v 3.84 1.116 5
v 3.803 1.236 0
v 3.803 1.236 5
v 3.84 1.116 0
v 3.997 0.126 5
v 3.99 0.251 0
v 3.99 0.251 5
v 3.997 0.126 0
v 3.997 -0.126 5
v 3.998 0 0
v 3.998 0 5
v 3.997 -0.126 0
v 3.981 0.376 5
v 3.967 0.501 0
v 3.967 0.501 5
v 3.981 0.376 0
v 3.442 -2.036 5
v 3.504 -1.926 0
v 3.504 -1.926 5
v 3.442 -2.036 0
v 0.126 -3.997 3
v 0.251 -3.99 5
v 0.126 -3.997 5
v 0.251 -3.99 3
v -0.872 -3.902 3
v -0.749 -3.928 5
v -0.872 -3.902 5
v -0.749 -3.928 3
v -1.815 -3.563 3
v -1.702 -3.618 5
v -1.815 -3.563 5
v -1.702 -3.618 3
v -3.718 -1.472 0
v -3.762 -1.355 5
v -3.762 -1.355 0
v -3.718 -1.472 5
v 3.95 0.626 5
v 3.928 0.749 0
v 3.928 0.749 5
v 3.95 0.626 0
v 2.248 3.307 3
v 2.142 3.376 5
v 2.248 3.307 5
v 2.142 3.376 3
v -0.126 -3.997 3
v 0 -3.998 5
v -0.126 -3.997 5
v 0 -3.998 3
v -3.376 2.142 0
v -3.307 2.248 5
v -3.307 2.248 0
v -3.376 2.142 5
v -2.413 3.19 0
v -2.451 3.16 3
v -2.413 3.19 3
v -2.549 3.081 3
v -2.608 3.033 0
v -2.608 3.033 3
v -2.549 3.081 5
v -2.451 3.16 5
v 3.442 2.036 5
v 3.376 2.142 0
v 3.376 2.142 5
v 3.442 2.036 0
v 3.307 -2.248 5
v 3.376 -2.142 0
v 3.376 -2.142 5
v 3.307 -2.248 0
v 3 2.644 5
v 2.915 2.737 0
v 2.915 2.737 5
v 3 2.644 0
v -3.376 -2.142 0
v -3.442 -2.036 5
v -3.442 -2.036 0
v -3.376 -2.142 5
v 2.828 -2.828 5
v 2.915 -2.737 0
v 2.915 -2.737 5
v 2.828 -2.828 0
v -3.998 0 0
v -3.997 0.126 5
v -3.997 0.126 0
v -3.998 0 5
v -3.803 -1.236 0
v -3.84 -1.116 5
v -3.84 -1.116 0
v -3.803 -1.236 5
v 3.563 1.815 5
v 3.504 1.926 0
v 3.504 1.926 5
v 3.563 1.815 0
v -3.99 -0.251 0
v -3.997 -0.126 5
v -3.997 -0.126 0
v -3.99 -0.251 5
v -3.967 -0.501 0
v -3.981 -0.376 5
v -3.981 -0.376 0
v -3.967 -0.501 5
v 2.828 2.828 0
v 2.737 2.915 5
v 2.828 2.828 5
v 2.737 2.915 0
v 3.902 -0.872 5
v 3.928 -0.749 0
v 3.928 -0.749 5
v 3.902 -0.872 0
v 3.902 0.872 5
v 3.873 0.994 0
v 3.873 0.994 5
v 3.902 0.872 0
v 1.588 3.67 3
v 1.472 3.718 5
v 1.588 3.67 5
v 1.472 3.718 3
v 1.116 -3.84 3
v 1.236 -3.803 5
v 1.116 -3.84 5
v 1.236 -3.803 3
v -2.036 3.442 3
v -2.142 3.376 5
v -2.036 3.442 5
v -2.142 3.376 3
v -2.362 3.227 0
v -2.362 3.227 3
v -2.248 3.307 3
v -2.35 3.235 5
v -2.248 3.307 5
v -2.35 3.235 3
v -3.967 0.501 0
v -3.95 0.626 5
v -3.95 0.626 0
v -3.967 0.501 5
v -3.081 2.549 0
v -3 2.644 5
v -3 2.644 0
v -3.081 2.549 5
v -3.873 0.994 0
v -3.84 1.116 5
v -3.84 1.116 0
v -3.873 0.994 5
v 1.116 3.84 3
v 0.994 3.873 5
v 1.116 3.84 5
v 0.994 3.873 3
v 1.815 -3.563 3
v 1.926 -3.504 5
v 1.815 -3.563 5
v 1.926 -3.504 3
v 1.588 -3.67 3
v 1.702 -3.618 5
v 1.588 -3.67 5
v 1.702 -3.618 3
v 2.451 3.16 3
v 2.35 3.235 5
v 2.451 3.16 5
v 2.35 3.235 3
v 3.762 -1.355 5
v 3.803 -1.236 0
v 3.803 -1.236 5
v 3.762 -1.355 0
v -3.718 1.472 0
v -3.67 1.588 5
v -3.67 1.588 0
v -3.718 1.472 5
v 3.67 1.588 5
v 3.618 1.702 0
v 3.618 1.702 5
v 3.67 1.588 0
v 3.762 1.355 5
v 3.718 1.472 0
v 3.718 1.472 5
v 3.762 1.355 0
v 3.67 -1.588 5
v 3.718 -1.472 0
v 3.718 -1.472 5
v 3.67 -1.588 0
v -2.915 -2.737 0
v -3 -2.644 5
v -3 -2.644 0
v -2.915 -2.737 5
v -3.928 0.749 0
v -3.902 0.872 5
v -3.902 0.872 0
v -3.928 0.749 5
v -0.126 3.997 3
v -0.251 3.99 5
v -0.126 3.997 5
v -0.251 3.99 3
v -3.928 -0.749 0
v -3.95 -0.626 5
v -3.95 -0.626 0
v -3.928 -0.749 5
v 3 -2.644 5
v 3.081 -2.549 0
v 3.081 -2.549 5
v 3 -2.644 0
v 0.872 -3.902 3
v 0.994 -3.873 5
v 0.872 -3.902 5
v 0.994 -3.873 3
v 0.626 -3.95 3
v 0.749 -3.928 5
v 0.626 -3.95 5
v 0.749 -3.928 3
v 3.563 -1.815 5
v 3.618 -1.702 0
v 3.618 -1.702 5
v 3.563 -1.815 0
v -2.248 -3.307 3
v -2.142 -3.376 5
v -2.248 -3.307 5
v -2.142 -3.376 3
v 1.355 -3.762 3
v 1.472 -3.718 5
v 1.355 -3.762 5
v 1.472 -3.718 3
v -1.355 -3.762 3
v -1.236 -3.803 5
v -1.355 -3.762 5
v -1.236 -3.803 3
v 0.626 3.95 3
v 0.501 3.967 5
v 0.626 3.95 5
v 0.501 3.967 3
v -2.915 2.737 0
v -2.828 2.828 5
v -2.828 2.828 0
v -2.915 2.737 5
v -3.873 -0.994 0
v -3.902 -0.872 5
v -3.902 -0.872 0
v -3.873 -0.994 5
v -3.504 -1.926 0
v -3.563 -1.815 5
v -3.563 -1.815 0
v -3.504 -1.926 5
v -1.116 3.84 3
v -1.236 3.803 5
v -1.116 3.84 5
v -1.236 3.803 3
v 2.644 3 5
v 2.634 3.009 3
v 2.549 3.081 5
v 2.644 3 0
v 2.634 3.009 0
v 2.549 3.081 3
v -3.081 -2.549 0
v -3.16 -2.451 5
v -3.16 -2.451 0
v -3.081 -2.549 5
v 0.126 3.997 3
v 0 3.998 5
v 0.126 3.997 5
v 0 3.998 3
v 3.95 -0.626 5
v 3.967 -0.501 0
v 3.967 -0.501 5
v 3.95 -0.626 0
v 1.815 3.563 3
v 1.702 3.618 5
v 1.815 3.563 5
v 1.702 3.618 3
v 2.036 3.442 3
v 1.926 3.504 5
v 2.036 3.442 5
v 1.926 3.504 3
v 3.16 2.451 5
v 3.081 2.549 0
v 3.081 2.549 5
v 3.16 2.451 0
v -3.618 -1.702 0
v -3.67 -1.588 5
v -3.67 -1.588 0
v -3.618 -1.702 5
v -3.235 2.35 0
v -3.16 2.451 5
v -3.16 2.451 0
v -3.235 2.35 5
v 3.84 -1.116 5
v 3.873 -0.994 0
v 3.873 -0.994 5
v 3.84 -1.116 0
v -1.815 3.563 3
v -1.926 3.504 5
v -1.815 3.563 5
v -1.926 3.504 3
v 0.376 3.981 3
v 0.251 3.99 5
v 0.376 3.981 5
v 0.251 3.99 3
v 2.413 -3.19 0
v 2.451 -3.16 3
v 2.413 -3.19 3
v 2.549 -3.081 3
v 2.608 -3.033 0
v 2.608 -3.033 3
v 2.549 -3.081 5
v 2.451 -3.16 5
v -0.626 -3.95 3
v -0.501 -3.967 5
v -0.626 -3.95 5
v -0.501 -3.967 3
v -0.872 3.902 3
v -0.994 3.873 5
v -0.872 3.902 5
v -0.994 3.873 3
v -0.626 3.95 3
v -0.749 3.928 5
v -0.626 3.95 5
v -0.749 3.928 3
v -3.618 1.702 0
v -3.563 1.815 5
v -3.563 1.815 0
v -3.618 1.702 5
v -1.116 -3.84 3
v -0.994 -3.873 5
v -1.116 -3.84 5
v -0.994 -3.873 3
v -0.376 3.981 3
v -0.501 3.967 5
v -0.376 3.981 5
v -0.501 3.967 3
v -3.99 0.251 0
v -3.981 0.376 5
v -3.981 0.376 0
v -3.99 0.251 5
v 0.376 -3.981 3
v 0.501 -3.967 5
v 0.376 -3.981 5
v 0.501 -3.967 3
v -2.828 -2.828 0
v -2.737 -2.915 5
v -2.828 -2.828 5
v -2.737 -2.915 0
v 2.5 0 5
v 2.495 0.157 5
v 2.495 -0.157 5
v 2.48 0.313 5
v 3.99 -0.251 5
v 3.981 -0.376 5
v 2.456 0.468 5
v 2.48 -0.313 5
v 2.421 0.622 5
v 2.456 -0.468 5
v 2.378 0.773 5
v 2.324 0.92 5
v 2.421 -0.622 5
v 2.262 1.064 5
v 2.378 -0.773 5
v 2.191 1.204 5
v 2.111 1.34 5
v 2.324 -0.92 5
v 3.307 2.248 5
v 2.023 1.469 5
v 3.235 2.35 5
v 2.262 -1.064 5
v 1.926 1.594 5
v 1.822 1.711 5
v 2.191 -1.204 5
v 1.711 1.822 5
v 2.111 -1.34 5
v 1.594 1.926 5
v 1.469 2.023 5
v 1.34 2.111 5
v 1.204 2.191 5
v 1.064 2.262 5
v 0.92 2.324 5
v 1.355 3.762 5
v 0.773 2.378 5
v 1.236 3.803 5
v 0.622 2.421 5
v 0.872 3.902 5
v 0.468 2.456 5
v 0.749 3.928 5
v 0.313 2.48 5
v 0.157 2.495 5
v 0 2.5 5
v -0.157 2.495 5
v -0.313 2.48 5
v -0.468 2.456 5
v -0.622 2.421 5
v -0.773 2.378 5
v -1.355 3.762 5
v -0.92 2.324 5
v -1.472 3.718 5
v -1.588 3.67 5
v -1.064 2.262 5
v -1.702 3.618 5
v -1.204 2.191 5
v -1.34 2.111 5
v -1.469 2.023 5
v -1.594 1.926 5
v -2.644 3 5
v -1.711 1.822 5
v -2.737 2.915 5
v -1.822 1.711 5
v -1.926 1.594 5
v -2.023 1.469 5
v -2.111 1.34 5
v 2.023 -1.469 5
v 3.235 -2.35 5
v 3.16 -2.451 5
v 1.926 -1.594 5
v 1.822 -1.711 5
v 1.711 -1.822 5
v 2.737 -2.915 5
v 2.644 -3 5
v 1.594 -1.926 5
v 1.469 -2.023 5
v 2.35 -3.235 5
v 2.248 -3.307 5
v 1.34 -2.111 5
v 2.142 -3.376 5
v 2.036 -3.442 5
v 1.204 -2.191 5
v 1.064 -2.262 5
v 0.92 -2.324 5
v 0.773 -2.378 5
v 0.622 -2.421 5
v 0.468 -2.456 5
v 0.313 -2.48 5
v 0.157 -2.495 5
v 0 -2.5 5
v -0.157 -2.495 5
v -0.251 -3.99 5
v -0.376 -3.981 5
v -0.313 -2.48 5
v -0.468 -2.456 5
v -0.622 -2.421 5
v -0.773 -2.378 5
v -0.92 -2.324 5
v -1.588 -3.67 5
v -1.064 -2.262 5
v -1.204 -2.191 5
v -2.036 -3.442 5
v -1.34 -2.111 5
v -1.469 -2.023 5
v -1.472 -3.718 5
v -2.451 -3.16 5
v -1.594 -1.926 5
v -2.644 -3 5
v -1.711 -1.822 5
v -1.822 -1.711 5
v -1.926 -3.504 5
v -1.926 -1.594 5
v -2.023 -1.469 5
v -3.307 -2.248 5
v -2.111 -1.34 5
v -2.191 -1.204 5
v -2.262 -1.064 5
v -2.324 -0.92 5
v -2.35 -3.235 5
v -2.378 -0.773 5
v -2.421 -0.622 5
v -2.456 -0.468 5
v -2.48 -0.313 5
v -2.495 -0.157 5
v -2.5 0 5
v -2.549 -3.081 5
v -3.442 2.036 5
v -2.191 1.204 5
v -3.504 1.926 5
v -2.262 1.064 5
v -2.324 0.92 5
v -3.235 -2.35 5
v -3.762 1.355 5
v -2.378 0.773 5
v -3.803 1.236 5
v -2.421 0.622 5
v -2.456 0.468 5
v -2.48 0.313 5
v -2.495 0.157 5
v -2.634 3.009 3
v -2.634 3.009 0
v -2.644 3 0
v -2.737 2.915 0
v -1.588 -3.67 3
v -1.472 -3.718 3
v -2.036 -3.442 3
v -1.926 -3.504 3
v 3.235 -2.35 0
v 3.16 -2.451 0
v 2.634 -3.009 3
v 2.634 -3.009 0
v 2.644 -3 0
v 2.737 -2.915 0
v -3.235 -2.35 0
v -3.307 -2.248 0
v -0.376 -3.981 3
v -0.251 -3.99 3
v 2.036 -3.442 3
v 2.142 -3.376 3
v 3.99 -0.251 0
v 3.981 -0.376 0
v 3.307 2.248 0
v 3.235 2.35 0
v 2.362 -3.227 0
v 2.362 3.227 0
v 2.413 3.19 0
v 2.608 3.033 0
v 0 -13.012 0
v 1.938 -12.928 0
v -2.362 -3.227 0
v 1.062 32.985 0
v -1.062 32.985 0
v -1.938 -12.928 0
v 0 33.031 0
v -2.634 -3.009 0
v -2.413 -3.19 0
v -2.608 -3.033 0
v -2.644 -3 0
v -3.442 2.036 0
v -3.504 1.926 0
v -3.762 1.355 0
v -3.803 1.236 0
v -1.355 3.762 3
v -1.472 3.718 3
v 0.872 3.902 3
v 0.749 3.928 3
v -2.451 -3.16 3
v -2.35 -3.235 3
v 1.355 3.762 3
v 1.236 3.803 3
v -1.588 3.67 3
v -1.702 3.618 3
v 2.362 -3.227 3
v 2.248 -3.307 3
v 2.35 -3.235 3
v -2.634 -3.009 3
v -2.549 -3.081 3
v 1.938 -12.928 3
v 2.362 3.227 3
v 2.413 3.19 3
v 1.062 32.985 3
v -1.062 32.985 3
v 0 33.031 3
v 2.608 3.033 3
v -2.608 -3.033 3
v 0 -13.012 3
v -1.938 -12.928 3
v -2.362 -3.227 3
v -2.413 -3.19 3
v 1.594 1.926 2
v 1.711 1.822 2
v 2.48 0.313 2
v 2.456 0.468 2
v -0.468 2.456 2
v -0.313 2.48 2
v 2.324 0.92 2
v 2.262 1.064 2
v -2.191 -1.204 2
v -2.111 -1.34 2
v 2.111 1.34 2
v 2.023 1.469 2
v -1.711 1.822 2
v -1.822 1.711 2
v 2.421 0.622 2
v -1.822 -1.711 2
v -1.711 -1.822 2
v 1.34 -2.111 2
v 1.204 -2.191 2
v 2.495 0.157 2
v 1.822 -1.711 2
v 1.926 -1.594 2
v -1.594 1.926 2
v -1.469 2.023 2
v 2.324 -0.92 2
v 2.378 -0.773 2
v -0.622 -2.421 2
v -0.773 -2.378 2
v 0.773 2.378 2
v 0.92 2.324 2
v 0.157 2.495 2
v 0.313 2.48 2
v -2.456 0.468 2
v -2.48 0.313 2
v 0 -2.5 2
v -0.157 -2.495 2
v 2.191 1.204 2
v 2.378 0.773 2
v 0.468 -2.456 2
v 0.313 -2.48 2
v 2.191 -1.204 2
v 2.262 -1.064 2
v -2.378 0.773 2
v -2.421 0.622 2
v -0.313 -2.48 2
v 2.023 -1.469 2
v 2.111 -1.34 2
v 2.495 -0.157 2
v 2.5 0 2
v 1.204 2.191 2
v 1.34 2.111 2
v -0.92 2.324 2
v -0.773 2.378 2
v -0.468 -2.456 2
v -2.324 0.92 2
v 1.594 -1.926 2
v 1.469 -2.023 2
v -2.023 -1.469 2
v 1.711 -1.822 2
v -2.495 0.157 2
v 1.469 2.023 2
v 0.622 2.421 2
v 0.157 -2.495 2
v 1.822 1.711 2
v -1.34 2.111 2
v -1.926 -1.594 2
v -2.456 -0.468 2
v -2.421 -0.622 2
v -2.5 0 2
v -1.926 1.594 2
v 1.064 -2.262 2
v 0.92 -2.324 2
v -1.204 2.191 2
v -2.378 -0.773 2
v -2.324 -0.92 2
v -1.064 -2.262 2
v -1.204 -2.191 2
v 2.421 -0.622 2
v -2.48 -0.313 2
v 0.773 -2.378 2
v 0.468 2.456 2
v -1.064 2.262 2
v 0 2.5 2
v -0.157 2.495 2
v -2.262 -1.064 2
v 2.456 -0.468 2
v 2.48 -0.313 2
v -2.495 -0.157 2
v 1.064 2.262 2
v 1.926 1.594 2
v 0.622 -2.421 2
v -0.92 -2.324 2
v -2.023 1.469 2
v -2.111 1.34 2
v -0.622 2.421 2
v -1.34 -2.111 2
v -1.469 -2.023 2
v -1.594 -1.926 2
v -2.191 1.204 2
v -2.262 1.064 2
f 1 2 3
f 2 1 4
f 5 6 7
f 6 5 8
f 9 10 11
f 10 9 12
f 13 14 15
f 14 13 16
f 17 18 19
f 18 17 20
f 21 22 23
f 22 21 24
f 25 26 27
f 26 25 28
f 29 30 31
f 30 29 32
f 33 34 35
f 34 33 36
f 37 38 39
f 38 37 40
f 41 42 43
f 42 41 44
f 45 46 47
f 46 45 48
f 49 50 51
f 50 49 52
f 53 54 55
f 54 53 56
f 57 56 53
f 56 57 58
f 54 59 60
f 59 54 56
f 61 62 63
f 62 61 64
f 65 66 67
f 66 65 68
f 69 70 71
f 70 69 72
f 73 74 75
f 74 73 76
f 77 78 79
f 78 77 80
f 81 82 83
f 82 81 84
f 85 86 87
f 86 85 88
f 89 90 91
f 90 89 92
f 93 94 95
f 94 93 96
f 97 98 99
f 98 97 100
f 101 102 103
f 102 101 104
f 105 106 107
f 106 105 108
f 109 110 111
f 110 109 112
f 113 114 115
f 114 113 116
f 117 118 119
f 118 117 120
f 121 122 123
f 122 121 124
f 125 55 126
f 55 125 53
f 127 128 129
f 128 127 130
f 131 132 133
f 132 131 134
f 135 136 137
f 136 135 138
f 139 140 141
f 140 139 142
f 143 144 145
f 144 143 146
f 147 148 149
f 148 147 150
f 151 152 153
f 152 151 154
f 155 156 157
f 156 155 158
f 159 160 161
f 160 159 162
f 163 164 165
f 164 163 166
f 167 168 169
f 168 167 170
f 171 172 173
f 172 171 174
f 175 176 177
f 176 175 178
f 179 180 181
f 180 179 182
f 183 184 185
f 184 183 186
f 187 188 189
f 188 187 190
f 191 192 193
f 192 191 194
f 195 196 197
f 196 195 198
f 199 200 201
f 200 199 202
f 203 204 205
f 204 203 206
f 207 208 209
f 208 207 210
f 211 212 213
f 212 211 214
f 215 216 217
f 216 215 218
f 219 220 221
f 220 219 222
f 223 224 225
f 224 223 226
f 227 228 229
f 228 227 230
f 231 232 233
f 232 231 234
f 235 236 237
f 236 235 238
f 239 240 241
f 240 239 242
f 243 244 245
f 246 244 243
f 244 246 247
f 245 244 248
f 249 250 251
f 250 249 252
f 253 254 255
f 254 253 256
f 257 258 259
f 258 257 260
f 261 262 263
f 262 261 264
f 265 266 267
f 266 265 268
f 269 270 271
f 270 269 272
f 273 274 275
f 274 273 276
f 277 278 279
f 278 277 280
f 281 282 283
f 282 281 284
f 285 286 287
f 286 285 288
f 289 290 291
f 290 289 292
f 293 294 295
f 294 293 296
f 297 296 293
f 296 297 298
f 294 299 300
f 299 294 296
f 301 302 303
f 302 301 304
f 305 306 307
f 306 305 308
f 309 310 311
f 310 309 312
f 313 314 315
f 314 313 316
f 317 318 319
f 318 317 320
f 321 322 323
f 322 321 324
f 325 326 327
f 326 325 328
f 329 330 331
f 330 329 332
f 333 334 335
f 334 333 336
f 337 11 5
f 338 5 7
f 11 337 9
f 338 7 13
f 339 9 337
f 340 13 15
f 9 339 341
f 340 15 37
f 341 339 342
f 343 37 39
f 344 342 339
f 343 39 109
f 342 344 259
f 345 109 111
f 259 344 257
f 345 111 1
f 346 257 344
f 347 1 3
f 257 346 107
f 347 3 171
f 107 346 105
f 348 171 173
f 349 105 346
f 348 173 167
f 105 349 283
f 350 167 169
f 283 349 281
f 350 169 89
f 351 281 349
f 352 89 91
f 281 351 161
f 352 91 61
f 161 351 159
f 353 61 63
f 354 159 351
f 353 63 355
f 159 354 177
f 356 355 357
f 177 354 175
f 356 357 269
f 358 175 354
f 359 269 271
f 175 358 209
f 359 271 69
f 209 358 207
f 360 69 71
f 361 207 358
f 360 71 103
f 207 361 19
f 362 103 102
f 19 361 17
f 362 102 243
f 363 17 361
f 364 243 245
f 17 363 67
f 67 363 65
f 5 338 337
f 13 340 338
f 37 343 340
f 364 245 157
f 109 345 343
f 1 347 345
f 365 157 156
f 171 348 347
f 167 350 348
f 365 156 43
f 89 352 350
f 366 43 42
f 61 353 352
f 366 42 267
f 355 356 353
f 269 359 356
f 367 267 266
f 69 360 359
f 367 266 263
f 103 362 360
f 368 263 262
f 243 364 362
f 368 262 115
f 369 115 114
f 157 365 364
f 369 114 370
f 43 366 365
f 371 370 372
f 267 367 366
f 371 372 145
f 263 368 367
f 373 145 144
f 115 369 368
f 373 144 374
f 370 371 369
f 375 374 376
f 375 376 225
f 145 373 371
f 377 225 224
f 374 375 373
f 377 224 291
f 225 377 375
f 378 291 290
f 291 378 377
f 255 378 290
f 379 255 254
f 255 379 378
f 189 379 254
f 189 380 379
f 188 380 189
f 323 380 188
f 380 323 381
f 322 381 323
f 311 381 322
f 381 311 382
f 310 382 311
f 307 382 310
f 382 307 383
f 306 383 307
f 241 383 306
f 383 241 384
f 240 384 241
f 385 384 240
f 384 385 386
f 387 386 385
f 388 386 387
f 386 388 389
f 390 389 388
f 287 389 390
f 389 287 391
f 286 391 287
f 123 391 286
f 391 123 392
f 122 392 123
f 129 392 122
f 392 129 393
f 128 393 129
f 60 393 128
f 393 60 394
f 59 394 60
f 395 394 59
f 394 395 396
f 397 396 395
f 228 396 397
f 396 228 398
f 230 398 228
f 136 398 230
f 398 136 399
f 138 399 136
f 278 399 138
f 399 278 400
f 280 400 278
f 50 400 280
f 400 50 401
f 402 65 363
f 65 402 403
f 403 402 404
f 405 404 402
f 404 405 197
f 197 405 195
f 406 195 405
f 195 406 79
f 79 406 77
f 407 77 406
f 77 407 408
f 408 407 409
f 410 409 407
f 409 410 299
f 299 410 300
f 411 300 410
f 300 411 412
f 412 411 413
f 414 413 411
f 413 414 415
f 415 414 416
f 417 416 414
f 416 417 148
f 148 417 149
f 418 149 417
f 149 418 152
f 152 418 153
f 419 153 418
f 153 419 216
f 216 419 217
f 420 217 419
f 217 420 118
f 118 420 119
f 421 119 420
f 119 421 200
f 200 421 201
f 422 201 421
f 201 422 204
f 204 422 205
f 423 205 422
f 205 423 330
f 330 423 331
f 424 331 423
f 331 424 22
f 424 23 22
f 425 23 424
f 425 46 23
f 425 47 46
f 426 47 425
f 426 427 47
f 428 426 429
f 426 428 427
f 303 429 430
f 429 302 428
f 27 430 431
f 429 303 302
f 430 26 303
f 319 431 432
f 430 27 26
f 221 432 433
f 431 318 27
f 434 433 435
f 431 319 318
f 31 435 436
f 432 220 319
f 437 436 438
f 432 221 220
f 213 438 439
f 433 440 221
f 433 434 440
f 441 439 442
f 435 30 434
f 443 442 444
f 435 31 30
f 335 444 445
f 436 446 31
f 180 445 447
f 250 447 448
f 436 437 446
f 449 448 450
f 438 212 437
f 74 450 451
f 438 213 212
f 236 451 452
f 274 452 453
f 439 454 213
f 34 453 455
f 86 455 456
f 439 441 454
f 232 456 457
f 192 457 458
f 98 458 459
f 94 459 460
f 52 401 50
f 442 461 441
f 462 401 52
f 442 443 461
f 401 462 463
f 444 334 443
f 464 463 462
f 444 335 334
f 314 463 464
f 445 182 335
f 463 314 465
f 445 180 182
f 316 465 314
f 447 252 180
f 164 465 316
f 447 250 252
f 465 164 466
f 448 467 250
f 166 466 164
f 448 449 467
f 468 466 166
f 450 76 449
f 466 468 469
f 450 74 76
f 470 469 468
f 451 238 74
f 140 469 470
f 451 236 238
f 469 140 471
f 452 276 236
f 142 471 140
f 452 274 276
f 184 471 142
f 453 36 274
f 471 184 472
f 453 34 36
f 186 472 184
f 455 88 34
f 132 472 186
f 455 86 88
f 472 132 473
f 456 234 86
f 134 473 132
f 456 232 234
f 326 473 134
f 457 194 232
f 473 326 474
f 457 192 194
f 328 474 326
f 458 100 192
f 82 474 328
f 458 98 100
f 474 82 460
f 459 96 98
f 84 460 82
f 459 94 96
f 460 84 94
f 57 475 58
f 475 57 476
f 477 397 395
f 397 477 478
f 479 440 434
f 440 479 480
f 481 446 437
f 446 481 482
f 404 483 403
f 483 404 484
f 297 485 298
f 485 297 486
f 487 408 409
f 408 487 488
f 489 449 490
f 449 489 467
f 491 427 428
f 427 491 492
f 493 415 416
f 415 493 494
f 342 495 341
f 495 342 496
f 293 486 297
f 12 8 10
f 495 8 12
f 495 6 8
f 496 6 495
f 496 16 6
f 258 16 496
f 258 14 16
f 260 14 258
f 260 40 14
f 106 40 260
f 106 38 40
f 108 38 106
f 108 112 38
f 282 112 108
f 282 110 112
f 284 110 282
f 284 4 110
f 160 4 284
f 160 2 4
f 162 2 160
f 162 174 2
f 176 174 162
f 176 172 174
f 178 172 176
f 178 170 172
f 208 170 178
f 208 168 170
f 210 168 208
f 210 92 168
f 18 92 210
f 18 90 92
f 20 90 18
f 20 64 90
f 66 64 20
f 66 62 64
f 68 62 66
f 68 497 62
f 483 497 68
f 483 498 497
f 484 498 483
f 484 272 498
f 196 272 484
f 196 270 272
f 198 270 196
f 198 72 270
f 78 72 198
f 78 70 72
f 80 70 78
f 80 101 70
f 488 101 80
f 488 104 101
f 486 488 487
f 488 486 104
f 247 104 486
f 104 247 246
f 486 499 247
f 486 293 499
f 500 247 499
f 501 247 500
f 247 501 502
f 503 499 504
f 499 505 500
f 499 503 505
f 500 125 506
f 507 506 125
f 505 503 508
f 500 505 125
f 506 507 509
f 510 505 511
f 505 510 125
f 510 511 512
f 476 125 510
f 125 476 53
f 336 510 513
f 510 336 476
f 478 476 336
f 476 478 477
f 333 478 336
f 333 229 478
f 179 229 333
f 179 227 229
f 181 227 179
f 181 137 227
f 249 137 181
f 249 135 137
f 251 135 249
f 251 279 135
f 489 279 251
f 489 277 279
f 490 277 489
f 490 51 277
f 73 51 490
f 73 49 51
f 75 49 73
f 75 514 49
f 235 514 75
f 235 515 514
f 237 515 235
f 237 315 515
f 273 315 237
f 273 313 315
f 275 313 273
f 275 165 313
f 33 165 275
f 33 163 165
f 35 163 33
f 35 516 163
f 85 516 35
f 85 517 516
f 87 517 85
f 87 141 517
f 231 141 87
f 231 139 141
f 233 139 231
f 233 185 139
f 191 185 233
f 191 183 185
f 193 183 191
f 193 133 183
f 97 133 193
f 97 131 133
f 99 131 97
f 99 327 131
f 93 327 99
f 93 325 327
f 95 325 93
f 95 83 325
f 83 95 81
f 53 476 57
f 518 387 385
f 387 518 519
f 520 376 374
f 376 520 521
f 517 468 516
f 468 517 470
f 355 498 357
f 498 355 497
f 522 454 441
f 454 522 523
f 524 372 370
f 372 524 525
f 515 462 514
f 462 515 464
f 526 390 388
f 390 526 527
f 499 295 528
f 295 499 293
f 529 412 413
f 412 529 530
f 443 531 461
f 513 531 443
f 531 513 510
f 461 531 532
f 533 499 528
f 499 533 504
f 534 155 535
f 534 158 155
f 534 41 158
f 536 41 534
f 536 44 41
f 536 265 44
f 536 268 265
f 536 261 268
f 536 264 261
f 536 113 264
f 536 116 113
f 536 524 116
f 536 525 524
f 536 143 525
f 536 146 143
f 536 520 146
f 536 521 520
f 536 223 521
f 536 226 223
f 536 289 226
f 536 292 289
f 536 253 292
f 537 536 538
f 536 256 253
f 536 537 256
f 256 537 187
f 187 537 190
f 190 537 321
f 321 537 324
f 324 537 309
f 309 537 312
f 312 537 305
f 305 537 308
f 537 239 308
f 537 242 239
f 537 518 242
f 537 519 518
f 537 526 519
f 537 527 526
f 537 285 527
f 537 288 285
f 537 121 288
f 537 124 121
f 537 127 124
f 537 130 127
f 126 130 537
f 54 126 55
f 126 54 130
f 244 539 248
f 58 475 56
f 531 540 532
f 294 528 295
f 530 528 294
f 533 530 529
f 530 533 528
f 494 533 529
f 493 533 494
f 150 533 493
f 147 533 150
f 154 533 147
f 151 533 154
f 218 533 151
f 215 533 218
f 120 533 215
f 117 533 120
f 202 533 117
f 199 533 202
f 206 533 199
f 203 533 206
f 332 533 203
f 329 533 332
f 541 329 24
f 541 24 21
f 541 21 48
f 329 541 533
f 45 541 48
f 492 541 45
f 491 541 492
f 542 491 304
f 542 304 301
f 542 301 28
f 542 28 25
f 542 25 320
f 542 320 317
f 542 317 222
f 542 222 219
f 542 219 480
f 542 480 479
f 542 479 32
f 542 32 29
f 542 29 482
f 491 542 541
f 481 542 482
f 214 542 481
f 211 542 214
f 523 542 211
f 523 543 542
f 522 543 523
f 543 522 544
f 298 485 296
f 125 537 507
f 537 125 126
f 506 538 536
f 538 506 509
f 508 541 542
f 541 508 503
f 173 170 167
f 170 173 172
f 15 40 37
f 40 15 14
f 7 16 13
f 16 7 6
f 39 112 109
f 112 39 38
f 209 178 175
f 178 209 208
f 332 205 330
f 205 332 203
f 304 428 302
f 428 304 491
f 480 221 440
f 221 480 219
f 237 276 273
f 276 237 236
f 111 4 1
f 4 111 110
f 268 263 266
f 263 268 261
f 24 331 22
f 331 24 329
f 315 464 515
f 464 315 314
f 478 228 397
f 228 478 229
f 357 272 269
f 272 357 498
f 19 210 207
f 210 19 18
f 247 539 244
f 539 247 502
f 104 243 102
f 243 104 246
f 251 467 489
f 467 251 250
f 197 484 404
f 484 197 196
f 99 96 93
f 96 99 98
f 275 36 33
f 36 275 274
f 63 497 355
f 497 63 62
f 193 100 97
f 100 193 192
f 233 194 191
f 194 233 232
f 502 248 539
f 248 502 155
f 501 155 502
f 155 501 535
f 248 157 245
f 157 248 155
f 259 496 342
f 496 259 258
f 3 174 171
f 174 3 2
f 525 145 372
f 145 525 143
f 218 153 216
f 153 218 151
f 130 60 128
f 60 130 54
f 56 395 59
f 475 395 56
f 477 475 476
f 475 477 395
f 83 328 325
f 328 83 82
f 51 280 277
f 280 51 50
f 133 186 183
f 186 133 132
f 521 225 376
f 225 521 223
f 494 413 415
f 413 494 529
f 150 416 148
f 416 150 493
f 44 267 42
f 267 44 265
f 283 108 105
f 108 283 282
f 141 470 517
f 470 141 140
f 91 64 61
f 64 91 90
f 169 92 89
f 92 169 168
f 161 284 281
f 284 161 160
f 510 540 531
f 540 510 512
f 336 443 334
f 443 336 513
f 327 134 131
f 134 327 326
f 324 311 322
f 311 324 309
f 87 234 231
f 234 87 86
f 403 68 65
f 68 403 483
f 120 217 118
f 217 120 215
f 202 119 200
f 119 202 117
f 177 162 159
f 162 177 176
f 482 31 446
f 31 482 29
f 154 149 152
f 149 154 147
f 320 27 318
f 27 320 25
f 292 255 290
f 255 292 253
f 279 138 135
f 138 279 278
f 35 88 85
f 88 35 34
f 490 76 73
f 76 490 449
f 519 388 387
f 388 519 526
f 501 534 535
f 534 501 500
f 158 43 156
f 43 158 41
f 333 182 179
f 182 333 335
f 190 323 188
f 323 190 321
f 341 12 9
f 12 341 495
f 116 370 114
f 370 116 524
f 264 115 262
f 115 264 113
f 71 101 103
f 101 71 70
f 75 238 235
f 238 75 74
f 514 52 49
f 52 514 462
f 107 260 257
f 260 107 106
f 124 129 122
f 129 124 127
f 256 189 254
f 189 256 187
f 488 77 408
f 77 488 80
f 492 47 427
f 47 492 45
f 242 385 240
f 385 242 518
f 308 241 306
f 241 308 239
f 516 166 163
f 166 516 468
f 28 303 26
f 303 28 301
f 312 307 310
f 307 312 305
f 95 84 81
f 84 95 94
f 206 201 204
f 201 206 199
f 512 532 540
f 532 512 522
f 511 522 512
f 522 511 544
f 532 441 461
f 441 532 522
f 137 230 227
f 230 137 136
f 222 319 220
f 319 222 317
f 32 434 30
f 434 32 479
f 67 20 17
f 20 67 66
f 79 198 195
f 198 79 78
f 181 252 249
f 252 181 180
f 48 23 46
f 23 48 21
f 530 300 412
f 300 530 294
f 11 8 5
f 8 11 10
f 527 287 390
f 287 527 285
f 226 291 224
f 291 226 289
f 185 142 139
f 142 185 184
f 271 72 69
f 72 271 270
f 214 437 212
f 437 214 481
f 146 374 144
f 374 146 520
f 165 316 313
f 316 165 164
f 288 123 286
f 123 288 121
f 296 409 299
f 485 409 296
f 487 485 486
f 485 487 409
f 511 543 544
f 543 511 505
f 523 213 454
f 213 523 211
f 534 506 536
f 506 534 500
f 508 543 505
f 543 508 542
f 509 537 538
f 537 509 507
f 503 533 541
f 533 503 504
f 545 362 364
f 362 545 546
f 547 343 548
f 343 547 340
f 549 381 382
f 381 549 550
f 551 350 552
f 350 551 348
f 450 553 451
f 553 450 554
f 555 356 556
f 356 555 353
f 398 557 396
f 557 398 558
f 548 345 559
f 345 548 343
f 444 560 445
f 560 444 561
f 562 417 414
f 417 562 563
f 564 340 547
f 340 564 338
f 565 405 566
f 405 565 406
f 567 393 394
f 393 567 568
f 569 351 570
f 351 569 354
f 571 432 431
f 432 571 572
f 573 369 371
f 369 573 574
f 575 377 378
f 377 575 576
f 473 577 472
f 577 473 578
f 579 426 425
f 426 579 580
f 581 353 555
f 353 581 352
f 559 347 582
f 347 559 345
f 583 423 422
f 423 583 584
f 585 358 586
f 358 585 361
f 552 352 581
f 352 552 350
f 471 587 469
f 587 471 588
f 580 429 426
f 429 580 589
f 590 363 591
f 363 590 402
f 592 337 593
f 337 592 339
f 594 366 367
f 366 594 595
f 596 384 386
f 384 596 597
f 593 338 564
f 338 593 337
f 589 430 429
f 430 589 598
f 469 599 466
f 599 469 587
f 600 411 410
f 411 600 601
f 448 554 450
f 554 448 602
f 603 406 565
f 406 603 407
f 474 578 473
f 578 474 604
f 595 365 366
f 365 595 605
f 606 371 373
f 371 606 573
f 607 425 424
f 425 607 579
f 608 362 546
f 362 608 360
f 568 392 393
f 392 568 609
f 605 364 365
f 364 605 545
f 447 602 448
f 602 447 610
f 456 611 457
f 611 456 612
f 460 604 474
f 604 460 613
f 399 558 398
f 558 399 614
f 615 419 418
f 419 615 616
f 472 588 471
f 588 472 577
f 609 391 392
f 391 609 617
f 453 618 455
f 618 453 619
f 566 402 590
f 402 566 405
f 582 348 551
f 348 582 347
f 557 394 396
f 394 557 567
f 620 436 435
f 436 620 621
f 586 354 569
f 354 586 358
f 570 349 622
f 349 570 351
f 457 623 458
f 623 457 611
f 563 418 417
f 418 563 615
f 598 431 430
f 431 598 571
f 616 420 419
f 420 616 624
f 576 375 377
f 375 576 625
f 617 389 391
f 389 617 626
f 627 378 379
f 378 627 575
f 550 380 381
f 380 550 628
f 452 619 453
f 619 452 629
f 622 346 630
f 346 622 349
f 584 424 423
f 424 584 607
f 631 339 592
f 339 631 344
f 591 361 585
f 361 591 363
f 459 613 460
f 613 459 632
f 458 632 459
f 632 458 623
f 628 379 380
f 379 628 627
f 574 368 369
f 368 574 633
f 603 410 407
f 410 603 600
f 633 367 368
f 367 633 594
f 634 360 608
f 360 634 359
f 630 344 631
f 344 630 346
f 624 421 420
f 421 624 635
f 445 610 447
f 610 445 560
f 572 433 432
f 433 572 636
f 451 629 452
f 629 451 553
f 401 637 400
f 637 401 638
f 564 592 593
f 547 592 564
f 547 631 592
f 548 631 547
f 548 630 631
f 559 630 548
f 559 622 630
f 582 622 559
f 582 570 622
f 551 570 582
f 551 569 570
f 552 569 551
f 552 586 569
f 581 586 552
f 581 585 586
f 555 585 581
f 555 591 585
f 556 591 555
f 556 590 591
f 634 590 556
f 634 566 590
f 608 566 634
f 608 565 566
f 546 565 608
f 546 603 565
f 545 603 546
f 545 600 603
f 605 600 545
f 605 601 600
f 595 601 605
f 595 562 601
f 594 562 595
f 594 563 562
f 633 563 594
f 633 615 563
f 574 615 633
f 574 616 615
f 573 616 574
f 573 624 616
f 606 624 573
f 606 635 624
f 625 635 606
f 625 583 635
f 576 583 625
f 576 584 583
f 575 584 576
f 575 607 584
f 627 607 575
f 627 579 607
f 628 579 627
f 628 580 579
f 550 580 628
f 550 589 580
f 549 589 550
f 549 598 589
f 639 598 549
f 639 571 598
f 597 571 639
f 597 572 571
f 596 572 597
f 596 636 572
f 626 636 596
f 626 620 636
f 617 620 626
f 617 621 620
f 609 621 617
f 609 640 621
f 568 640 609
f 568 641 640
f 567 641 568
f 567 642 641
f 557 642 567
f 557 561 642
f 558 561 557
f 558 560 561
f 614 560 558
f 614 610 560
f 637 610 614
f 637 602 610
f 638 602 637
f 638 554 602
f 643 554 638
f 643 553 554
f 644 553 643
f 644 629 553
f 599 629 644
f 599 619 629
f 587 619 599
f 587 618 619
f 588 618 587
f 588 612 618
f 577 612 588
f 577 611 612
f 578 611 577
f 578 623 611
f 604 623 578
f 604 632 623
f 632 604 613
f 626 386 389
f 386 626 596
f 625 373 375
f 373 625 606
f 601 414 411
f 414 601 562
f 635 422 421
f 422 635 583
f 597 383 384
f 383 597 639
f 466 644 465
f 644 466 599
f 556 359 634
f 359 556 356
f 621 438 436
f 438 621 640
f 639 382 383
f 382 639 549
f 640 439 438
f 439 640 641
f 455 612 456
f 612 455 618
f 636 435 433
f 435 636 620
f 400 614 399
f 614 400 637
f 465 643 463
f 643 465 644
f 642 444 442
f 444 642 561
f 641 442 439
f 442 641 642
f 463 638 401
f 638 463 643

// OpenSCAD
$fn = 100;

module needle_arm_rot(angle)
{
	rotate(v = [0, 0, 1], a = angle)
	union() {
		cylinder(r1 = 4, r2 = 4, h = 5);
		translate(v = [-2.5, -13, 0])
			cube(size = [5, 46, 3]);
	}
}

module needle_arm()
{
	intersection() {
		needle_arm_rot(-2.5);
		needle_arm_rot(2.5);
	}
}

module needle_hub()
{
	difference() {
		needle_arm();
		translate(v = [0, 0, 2])
			cylinder(r1 = 2.5, r2 = 2.5, h = 5);
	}
}


needle_hub();
